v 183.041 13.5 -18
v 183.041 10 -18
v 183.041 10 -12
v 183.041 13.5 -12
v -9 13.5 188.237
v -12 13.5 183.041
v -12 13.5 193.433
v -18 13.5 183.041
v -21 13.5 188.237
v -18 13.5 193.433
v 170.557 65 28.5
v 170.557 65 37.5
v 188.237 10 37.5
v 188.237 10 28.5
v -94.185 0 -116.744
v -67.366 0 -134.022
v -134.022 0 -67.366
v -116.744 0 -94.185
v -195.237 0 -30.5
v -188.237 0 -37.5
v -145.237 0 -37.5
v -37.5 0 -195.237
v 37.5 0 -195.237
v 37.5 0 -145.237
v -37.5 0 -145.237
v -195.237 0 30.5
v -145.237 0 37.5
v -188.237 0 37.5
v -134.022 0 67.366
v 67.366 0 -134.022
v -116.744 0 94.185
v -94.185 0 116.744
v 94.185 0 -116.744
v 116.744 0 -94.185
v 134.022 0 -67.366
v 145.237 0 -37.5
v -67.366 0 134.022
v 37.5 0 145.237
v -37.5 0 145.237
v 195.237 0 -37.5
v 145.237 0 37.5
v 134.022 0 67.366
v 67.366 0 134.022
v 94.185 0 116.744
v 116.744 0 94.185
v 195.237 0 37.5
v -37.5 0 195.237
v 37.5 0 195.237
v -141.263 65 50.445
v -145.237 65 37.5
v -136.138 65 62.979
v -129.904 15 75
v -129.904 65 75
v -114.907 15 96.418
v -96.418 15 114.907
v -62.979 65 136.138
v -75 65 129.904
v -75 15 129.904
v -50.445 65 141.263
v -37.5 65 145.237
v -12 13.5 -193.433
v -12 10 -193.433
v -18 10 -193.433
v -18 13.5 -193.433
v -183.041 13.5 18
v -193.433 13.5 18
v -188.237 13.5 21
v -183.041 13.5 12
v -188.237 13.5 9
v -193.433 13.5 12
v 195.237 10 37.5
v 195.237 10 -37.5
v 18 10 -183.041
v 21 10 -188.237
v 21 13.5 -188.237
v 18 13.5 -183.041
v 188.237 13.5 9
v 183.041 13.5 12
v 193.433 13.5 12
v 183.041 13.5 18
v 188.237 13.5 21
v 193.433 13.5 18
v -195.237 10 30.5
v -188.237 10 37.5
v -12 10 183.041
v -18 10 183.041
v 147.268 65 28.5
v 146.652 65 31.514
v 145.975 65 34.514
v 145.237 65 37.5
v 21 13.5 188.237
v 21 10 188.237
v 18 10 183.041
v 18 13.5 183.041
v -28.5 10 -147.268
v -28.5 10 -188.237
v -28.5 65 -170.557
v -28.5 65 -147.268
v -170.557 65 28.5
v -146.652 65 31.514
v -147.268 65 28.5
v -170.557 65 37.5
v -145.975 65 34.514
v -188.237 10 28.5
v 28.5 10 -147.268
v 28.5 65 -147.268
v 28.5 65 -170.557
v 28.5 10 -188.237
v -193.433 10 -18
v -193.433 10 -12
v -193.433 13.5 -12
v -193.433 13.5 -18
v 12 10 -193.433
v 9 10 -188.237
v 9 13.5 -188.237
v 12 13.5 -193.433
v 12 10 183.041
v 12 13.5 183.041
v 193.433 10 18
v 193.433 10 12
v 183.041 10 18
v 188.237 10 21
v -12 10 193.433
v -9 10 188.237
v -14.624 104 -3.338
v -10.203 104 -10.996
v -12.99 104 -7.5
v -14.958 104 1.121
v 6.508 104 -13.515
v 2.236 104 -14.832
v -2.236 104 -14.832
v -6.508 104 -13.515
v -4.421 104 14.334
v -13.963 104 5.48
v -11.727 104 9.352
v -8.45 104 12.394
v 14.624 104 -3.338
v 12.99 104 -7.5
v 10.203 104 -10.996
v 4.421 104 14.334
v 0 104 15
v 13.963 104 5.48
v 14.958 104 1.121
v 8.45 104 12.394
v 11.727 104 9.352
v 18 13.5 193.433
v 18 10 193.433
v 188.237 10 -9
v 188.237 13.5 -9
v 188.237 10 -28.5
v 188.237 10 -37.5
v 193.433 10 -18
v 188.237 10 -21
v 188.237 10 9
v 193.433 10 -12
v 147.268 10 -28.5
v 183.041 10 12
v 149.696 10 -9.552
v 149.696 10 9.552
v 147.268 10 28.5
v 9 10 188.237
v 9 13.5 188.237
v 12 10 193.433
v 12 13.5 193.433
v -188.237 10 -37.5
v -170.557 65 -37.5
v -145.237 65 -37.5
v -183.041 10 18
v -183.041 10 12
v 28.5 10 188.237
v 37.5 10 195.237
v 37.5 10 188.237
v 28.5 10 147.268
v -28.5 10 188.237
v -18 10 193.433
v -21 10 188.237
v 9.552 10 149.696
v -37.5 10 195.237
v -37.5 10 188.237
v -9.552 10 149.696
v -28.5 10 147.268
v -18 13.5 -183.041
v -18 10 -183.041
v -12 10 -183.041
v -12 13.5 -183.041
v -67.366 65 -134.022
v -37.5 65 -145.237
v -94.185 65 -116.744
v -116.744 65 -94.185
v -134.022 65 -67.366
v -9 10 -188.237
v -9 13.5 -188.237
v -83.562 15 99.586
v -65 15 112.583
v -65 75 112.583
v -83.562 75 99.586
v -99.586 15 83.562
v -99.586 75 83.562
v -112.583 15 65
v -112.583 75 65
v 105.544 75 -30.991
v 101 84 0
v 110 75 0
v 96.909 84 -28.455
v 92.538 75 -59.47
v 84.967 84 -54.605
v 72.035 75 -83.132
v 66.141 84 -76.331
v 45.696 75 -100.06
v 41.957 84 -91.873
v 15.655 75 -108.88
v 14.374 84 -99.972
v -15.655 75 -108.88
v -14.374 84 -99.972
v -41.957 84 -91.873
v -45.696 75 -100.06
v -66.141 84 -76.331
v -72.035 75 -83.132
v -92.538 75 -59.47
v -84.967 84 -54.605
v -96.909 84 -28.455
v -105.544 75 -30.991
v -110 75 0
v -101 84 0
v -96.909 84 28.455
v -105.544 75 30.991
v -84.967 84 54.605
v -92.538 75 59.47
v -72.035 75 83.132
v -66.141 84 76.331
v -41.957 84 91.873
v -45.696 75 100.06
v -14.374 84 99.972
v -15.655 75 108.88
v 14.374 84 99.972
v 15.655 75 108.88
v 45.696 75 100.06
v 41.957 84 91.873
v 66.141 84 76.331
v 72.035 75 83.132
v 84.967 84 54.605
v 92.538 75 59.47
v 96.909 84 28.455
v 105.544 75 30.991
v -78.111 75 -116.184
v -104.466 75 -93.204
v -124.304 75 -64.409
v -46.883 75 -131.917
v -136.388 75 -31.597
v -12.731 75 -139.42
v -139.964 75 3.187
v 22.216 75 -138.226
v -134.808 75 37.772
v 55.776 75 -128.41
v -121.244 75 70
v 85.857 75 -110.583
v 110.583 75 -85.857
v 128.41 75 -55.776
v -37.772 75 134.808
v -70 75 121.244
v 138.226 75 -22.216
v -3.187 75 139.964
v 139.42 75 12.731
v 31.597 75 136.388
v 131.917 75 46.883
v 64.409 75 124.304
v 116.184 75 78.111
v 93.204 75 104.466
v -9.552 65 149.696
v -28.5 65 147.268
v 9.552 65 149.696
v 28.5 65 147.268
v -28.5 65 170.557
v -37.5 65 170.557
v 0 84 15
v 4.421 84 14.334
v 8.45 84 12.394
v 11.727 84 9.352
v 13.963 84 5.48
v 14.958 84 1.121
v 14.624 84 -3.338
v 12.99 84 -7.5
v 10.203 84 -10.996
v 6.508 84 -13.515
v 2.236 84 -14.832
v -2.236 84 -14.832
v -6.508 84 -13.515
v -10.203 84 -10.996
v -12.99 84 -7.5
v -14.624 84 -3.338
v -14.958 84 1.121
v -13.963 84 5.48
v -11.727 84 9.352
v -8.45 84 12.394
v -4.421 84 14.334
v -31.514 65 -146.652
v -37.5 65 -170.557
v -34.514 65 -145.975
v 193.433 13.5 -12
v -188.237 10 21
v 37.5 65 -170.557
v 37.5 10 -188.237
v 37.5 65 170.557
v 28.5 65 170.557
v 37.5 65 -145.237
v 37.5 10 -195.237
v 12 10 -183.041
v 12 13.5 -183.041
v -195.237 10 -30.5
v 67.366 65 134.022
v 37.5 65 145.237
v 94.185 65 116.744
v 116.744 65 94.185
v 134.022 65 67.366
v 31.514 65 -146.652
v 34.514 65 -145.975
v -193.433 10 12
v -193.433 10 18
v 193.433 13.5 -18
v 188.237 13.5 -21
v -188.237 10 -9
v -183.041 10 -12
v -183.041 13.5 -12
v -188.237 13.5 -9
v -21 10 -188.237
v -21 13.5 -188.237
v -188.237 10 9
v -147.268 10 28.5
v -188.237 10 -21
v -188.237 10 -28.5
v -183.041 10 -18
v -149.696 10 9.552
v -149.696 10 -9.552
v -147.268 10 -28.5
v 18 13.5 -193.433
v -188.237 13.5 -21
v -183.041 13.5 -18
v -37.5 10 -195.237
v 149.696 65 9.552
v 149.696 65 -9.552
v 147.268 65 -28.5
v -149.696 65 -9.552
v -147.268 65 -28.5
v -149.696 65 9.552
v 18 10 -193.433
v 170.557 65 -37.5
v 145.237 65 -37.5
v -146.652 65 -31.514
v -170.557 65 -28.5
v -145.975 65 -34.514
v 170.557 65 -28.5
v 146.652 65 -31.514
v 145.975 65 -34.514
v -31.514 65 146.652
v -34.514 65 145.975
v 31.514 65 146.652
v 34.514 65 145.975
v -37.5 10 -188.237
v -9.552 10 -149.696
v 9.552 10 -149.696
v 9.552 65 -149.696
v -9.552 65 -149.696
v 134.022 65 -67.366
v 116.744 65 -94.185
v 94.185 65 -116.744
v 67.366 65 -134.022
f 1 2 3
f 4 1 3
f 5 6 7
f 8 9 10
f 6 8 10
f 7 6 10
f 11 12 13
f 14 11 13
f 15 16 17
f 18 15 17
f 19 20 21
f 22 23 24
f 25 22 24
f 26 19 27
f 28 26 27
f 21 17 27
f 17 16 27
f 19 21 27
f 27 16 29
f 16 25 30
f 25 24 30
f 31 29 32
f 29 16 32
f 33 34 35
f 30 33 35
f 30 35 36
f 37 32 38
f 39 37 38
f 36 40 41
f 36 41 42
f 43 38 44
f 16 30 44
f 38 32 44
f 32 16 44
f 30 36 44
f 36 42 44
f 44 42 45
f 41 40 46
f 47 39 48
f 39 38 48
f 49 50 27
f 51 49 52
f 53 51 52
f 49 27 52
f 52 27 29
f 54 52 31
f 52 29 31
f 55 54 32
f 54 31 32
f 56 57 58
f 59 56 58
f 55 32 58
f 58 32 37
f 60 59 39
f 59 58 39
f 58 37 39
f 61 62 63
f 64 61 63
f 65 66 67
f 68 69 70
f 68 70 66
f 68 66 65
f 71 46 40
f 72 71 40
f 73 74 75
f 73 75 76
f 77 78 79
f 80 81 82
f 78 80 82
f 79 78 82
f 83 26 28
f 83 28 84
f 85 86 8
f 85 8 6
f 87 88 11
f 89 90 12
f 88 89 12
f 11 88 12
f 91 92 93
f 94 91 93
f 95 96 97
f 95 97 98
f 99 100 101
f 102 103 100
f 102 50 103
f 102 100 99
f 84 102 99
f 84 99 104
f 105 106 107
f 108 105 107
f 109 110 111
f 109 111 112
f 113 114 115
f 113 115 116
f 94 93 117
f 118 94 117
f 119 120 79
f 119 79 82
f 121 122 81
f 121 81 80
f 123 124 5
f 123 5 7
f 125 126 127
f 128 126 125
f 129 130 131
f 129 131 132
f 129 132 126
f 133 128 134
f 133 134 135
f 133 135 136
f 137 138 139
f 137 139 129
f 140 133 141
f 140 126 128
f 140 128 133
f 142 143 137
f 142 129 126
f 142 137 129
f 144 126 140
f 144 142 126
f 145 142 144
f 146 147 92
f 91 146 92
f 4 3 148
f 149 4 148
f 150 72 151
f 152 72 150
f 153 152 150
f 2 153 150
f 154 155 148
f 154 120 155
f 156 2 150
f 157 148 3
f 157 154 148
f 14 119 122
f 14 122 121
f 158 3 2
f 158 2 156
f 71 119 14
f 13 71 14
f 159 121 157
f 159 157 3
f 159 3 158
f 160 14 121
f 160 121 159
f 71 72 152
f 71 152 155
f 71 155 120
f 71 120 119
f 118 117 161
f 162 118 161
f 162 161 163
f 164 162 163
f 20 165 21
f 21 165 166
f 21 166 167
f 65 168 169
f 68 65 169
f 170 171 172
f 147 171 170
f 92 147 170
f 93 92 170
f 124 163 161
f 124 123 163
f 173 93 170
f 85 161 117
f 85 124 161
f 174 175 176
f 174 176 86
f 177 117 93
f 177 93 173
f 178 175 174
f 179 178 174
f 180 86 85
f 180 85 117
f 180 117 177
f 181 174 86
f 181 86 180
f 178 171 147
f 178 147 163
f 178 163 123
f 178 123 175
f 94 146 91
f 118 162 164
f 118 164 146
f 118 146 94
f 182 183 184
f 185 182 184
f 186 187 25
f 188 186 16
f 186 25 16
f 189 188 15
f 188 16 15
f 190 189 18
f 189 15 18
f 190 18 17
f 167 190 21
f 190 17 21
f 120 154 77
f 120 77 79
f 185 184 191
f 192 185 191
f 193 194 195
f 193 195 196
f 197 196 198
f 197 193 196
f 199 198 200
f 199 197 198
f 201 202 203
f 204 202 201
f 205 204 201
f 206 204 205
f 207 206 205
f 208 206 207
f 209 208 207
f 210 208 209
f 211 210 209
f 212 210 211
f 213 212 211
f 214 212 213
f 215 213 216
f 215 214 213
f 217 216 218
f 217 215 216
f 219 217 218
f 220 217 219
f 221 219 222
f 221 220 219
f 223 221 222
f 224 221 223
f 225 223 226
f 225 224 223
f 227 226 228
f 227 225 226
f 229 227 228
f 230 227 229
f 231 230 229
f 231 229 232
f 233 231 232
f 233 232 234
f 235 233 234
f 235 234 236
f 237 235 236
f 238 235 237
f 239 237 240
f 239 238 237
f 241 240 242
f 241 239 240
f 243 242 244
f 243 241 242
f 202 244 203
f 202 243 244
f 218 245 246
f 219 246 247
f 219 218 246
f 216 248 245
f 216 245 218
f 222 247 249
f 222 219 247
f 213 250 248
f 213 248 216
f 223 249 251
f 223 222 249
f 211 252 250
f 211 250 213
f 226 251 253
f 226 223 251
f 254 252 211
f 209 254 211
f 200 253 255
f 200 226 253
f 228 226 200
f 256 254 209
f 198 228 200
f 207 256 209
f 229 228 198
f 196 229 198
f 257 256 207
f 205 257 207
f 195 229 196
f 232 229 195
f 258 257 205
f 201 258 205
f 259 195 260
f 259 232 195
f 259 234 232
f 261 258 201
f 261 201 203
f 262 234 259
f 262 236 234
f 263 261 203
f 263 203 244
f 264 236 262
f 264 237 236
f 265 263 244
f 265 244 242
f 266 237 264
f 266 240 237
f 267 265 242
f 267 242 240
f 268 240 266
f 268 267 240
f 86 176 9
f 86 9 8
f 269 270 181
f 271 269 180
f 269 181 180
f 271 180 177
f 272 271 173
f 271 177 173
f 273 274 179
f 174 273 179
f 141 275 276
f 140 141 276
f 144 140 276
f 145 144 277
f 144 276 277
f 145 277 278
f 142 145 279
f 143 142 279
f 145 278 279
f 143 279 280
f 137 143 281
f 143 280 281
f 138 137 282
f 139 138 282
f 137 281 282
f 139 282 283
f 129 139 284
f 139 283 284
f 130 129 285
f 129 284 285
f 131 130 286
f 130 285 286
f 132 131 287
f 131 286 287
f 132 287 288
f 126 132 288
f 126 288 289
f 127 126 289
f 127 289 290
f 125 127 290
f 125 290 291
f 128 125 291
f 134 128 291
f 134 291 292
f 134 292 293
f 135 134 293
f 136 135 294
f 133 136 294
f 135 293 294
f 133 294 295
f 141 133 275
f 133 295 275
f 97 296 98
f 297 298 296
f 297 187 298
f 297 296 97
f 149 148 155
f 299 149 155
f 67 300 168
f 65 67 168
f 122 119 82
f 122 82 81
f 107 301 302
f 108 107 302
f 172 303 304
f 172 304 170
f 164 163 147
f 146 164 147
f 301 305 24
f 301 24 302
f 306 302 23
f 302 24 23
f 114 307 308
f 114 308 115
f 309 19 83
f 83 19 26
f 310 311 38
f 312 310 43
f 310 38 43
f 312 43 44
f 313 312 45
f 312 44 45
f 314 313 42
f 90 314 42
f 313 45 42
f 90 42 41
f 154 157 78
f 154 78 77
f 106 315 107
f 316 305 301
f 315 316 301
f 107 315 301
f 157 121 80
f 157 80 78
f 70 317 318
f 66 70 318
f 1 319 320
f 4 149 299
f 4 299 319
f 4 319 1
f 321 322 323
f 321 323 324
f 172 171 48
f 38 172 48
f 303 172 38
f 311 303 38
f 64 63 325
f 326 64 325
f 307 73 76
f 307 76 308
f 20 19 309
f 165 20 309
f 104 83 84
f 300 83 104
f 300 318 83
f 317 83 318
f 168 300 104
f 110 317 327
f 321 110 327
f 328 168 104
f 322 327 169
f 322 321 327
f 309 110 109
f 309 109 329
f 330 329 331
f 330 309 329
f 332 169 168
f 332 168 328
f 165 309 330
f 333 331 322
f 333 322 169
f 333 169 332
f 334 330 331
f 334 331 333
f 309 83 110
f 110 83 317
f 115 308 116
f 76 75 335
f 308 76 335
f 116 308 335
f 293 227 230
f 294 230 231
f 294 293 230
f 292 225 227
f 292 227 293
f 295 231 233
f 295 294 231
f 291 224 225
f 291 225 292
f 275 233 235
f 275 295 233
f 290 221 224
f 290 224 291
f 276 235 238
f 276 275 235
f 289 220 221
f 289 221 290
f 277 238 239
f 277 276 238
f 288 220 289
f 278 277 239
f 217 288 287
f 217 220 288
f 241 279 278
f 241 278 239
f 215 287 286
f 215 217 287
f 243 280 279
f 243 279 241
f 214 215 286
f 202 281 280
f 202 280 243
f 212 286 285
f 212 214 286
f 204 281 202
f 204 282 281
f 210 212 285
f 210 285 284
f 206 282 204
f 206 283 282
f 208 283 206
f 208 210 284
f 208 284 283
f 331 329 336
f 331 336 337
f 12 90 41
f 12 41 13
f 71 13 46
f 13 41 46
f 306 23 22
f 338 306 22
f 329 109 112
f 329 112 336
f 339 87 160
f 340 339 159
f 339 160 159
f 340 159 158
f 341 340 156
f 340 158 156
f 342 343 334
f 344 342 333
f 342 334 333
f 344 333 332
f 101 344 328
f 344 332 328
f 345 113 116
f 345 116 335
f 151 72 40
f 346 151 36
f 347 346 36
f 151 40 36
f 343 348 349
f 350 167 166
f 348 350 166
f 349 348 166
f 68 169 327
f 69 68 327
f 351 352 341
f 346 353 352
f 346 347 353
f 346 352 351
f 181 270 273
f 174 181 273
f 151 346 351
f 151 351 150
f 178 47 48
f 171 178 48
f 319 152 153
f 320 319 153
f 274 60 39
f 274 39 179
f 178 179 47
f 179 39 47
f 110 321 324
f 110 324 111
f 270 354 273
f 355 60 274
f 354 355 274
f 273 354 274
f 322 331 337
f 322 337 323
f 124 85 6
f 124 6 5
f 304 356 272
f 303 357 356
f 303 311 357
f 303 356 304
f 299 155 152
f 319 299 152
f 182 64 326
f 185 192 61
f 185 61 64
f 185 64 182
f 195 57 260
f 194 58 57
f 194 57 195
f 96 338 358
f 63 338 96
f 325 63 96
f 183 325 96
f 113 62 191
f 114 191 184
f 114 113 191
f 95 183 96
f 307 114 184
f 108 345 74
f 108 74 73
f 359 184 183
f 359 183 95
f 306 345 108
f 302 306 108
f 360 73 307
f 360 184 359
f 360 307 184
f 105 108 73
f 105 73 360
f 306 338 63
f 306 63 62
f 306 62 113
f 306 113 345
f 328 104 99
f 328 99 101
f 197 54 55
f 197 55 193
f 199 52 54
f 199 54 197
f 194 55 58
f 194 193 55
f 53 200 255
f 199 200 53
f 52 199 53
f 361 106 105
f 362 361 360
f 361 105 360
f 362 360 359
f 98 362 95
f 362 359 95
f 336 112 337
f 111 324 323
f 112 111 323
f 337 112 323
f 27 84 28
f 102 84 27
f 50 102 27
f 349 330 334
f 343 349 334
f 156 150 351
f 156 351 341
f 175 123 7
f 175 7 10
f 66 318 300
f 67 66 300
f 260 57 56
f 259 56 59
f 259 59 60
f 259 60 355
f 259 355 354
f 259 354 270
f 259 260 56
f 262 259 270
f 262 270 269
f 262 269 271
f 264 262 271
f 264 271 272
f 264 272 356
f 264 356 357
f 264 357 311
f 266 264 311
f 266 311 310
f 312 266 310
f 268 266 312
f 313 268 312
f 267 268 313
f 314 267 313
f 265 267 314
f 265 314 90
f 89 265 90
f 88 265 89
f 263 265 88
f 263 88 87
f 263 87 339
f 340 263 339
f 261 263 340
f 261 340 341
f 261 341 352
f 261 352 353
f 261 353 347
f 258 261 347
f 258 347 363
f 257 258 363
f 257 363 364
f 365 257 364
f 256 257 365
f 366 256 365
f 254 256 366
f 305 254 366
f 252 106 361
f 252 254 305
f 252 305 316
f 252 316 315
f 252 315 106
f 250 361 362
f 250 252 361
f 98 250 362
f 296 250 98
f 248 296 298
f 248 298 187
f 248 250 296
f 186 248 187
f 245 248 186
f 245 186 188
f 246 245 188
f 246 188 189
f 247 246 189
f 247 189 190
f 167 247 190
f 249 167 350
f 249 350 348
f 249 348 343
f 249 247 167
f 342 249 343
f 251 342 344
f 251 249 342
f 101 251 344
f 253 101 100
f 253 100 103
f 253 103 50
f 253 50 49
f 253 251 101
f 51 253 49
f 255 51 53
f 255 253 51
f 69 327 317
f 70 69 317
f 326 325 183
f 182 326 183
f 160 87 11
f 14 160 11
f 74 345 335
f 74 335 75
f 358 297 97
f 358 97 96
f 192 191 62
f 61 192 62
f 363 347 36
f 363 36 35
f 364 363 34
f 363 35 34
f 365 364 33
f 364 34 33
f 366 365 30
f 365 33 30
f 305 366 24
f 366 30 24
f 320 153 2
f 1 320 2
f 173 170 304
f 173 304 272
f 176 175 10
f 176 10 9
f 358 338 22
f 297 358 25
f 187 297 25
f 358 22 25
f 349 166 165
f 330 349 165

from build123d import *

# Parameters (mm, degrees)
SKETCH1_R                = 150
BOSS_EXTRUDE1_DEPTH      = 75
CHAMFER1_SIZE            = 10
BOSS_EXTRUDE2_START      = -75
BOSS_EXTRUDE2_DEPTH      = 10
CHAMFER2_SIZE            = 7
BOSS_EXTRUDE3_DEPTH      = 9
BOSS_EXTRUDE4_DEPTH      = 3.5
CIRPATTERN1_COUNT        = 4
CIRPATTERN1_COPY_1_DEPTH = 9
CIRPATTERN1_COPY_2_DEPTH = 9
CIRPATTERN1_COPY_3_DEPTH = 9
CIRPATTERN1_COPY_4_DEPTH = 3.5
CIRPATTERN1_COPY_5_DEPTH = 3.5
CIRPATTERN1_COPY_6_DEPTH = 3.5
CUT_EXTRUDE1_START       = -60
CUT_EXTRUDE1_DEPTH       = 60
SKETCH6_R                = 110
BOSS_EXTRUDE5_DEPTH      = 9
BOSS_EXTRUDE5_TAPER      = 45
SKETCH7_R                = 15
BOSS_EXTRUDE6_DEPTH      = 20


with BuildPart() as part:
    # Sketch1 → Boss-Extrude1 (new body)
    with BuildSketch(Plane(origin=(0, 0, 0), x_dir=(1, 0, 0), z_dir=(0, 1, 0))):
        with Locations(Location((0, 0, 0), (0, 0, 270))):
            Circle(SKETCH1_R)
    extrude(amount=BOSS_EXTRUDE1_DEPTH)

    # Chamfer1
    chamfer1_edges = [part.edges().sort_by_distance(p)[0] for p in [
        (0, 75, -150),
    ]]
    chamfer(chamfer1_edges, length=CHAMFER1_SIZE)

    # Sketch2 → Boss-Extrude2 (add)
    with BuildSketch(Plane(origin=(0, 75, 0), x_dir=(1, 0, 0), z_dir=(0, 1, 0)).offset(BOSS_EXTRUDE2_START)):
        with BuildLine():
            Line((-145.236875483, 37.5), (-195.236875483, 37.5))
            Line((-195.236875483, 37.5), (-195.236875483, -37.5))
            Line((-195.236875483, -37.5), (-145.236875483, -37.5))
            ThreePointArc((-145.236875483, -37.5), (-150, 0), (-145.236875483, 37.5))
        make_face()
    boss_extrude2 = extrude(amount=BOSS_EXTRUDE2_DEPTH)

    # Chamfer2
    chamfer2_edges = [part.edges().sort_by_distance(p)[0] for p in [
        (-195.236875483, 5, -37.5),
        (-195.236875483, 5, 37.5),
    ]]
    chamfer(chamfer2_edges, length=CHAMFER2_SIZE)

    # Sketch3 → Boss-Extrude3 (add)
    with BuildSketch(Plane.XY.offset(37.5)):
        Polygon((-145.236875483, 10), (-145.236875483, 65), (-170.556875483, 65), (-188.236875483, 10), align=None)
    boss_extrude3 = extrude(amount=-BOSS_EXTRUDE3_DEPTH)

    # Sketch4 → Boss-Extrude4 (add)
    with BuildSketch(Plane(origin=(0, 10, 0), x_dir=(1, 0, 0), z_dir=(0, 1, 0))):
        Polygon((-183.04072306, -12), (-188.236875483, -9), (-193.433027905, -12), (-193.433027905, -18), (-188.236875483, -21), (-183.04072306, -18), align=None)
    boss_extrude4 = extrude(amount=BOSS_EXTRUDE4_DEPTH)

    # Mirror1: Boss-Extrude3, Boss-Extrude4 across plane
    add(boss_extrude3.mirror(Plane.XY))
    add(boss_extrude4.mirror(Plane.XY))

    # CirPattern1: Boss-Extrude2, Boss-Extrude3, Boss-Extrude4 ×4 about axis
    cirpattern1_axis = Axis((0, 0, 0), (0, 1, 0))
    add([boss_extrude2.rotate(cirpattern1_axis, i * 360 / CIRPATTERN1_COUNT) for i in range(1, CIRPATTERN1_COUNT)])
    add([boss_extrude3.rotate(cirpattern1_axis, i * 360 / CIRPATTERN1_COUNT) for i in range(1, CIRPATTERN1_COUNT)])
    add([boss_extrude4.rotate(cirpattern1_axis, i * 360 / CIRPATTERN1_COUNT) for i in range(1, CIRPATTERN1_COUNT)])

    # CirPattern1 copy 1 sketch → CirPattern1 copy 1 (add)
    with BuildSketch(Plane(origin=(-37.5, 0, 0), x_dir=(0, 0, -1), z_dir=(-1, 0, 0))):
        Polygon((-145.236875483, -10), (-145.236875483, -65), (-170.556875483, -65), (-188.236875483, -10), align=None)
    extrude(amount=-CIRPATTERN1_COPY_1_DEPTH)

    # CirPattern1 copy 2 sketch → CirPattern1 copy 2 (add)
    with BuildSketch(Plane(origin=(0, 0, 37.5), x_dir=(-1, 0, 0), z_dir=(0, 0, 1))):
        Polygon((-145.236875483, -10), (-145.236875483, -65), (-170.556875483, -65), (-188.236875483, -10), align=None)
    extrude(amount=-CIRPATTERN1_COPY_2_DEPTH)

    # CirPattern1 copy 3 sketch → CirPattern1 copy 3 (add)
    with BuildSketch(Plane(origin=(37.5, 0, 0), x_dir=(0, 0, 1), z_dir=(1, 0, 0))):
        Polygon((-145.236875483, -10), (-145.236875483, -65), (-170.556875483, -65), (-188.236875483, -10), align=None)
    extrude(amount=-CIRPATTERN1_COPY_3_DEPTH)

    # CirPattern1 copy 4 sketch → CirPattern1 copy 4 (add)
    with BuildSketch(Plane(origin=(0, 10, 0), x_dir=(0, 0, -1), z_dir=(0, 1, 0))):
        Polygon((-183.04072306, 12), (-188.236875483, 9), (-193.433027905, 12), (-193.433027905, 18), (-188.236875483, 21), (-183.04072306, 18), align=None)
    extrude(amount=CIRPATTERN1_COPY_4_DEPTH)

    # CirPattern1 copy 5 sketch → CirPattern1 copy 5 (add)
    with BuildSketch(Plane(origin=(0, 10, 0), x_dir=(-1, 0, 0), z_dir=(0, 1, 0))):
        Polygon((-183.04072306, 12), (-188.236875483, 9), (-193.433027905, 12), (-193.433027905, 18), (-188.236875483, 21), (-183.04072306, 18), align=None)
    extrude(amount=CIRPATTERN1_COPY_5_DEPTH)

    # CirPattern1 copy 6 sketch → CirPattern1 copy 6 (add)
    with BuildSketch(Plane.ZX.offset(10)):
        Polygon((-183.04072306, 12), (-188.236875483, 9), (-193.433027905, 12), (-193.433027905, 18), (-188.236875483, 21), (-183.04072306, 18), align=None)
    extrude(amount=CIRPATTERN1_COPY_6_DEPTH)

    # Sketch5 → Cut-Extrude1 (cut)
    with BuildSketch(Plane(origin=(0, 75, 0), x_dir=(1, 0, 0), z_dir=(0, 1, 0)).offset(CUT_EXTRUDE1_START)):
        with BuildLine():
            ThreePointArc((-65, -112.583302492), (-91.923881554, -91.923881554), (-112.583302492, -65))
            Line((-112.583302492, -65), (-121.24355653, -70))
            ThreePointArc((-121.24355653, -70), (-98.994949366, -98.994949366), (-70, -121.24355653))
            Line((-70, -121.24355653), (-65, -112.583302492))
        make_face()
        with BuildLine():
            ThreePointArc((-70, -121.24355653), (-98.994949366, -98.994949366), (-121.24355653, -70))
            Line((-121.24355653, -70), (-129.903810568, -75))
            ThreePointArc((-129.903810568, -75), (-106.066017178, -106.066017178), (-75, -129.903810568))
            Line((-75, -129.903810568), (-70, -121.24355653))
        make_face()
    extrude(amount=CUT_EXTRUDE1_DEPTH, mode=Mode.SUBTRACT)

    # Sketch6 → Boss-Extrude5 (add)
    with BuildSketch(Plane(origin=(0, 75, 0), x_dir=(1, 0, 0), z_dir=(0, 1, 0))):
        Circle(SKETCH6_R)
    extrude(amount=BOSS_EXTRUDE5_DEPTH, taper=BOSS_EXTRUDE5_TAPER)

    # Sketch7 → Boss-Extrude6 (add)
    with BuildSketch(Plane(origin=(0, 84, 0), x_dir=(1, 0, 0), z_dir=(0, 1, 0))):
        with Locations(Location((0, 0, 0), (0, 0, 270))):
            Circle(SKETCH7_R)
    extrude(amount=BOSS_EXTRUDE6_DEPTH)


solid = part.part
